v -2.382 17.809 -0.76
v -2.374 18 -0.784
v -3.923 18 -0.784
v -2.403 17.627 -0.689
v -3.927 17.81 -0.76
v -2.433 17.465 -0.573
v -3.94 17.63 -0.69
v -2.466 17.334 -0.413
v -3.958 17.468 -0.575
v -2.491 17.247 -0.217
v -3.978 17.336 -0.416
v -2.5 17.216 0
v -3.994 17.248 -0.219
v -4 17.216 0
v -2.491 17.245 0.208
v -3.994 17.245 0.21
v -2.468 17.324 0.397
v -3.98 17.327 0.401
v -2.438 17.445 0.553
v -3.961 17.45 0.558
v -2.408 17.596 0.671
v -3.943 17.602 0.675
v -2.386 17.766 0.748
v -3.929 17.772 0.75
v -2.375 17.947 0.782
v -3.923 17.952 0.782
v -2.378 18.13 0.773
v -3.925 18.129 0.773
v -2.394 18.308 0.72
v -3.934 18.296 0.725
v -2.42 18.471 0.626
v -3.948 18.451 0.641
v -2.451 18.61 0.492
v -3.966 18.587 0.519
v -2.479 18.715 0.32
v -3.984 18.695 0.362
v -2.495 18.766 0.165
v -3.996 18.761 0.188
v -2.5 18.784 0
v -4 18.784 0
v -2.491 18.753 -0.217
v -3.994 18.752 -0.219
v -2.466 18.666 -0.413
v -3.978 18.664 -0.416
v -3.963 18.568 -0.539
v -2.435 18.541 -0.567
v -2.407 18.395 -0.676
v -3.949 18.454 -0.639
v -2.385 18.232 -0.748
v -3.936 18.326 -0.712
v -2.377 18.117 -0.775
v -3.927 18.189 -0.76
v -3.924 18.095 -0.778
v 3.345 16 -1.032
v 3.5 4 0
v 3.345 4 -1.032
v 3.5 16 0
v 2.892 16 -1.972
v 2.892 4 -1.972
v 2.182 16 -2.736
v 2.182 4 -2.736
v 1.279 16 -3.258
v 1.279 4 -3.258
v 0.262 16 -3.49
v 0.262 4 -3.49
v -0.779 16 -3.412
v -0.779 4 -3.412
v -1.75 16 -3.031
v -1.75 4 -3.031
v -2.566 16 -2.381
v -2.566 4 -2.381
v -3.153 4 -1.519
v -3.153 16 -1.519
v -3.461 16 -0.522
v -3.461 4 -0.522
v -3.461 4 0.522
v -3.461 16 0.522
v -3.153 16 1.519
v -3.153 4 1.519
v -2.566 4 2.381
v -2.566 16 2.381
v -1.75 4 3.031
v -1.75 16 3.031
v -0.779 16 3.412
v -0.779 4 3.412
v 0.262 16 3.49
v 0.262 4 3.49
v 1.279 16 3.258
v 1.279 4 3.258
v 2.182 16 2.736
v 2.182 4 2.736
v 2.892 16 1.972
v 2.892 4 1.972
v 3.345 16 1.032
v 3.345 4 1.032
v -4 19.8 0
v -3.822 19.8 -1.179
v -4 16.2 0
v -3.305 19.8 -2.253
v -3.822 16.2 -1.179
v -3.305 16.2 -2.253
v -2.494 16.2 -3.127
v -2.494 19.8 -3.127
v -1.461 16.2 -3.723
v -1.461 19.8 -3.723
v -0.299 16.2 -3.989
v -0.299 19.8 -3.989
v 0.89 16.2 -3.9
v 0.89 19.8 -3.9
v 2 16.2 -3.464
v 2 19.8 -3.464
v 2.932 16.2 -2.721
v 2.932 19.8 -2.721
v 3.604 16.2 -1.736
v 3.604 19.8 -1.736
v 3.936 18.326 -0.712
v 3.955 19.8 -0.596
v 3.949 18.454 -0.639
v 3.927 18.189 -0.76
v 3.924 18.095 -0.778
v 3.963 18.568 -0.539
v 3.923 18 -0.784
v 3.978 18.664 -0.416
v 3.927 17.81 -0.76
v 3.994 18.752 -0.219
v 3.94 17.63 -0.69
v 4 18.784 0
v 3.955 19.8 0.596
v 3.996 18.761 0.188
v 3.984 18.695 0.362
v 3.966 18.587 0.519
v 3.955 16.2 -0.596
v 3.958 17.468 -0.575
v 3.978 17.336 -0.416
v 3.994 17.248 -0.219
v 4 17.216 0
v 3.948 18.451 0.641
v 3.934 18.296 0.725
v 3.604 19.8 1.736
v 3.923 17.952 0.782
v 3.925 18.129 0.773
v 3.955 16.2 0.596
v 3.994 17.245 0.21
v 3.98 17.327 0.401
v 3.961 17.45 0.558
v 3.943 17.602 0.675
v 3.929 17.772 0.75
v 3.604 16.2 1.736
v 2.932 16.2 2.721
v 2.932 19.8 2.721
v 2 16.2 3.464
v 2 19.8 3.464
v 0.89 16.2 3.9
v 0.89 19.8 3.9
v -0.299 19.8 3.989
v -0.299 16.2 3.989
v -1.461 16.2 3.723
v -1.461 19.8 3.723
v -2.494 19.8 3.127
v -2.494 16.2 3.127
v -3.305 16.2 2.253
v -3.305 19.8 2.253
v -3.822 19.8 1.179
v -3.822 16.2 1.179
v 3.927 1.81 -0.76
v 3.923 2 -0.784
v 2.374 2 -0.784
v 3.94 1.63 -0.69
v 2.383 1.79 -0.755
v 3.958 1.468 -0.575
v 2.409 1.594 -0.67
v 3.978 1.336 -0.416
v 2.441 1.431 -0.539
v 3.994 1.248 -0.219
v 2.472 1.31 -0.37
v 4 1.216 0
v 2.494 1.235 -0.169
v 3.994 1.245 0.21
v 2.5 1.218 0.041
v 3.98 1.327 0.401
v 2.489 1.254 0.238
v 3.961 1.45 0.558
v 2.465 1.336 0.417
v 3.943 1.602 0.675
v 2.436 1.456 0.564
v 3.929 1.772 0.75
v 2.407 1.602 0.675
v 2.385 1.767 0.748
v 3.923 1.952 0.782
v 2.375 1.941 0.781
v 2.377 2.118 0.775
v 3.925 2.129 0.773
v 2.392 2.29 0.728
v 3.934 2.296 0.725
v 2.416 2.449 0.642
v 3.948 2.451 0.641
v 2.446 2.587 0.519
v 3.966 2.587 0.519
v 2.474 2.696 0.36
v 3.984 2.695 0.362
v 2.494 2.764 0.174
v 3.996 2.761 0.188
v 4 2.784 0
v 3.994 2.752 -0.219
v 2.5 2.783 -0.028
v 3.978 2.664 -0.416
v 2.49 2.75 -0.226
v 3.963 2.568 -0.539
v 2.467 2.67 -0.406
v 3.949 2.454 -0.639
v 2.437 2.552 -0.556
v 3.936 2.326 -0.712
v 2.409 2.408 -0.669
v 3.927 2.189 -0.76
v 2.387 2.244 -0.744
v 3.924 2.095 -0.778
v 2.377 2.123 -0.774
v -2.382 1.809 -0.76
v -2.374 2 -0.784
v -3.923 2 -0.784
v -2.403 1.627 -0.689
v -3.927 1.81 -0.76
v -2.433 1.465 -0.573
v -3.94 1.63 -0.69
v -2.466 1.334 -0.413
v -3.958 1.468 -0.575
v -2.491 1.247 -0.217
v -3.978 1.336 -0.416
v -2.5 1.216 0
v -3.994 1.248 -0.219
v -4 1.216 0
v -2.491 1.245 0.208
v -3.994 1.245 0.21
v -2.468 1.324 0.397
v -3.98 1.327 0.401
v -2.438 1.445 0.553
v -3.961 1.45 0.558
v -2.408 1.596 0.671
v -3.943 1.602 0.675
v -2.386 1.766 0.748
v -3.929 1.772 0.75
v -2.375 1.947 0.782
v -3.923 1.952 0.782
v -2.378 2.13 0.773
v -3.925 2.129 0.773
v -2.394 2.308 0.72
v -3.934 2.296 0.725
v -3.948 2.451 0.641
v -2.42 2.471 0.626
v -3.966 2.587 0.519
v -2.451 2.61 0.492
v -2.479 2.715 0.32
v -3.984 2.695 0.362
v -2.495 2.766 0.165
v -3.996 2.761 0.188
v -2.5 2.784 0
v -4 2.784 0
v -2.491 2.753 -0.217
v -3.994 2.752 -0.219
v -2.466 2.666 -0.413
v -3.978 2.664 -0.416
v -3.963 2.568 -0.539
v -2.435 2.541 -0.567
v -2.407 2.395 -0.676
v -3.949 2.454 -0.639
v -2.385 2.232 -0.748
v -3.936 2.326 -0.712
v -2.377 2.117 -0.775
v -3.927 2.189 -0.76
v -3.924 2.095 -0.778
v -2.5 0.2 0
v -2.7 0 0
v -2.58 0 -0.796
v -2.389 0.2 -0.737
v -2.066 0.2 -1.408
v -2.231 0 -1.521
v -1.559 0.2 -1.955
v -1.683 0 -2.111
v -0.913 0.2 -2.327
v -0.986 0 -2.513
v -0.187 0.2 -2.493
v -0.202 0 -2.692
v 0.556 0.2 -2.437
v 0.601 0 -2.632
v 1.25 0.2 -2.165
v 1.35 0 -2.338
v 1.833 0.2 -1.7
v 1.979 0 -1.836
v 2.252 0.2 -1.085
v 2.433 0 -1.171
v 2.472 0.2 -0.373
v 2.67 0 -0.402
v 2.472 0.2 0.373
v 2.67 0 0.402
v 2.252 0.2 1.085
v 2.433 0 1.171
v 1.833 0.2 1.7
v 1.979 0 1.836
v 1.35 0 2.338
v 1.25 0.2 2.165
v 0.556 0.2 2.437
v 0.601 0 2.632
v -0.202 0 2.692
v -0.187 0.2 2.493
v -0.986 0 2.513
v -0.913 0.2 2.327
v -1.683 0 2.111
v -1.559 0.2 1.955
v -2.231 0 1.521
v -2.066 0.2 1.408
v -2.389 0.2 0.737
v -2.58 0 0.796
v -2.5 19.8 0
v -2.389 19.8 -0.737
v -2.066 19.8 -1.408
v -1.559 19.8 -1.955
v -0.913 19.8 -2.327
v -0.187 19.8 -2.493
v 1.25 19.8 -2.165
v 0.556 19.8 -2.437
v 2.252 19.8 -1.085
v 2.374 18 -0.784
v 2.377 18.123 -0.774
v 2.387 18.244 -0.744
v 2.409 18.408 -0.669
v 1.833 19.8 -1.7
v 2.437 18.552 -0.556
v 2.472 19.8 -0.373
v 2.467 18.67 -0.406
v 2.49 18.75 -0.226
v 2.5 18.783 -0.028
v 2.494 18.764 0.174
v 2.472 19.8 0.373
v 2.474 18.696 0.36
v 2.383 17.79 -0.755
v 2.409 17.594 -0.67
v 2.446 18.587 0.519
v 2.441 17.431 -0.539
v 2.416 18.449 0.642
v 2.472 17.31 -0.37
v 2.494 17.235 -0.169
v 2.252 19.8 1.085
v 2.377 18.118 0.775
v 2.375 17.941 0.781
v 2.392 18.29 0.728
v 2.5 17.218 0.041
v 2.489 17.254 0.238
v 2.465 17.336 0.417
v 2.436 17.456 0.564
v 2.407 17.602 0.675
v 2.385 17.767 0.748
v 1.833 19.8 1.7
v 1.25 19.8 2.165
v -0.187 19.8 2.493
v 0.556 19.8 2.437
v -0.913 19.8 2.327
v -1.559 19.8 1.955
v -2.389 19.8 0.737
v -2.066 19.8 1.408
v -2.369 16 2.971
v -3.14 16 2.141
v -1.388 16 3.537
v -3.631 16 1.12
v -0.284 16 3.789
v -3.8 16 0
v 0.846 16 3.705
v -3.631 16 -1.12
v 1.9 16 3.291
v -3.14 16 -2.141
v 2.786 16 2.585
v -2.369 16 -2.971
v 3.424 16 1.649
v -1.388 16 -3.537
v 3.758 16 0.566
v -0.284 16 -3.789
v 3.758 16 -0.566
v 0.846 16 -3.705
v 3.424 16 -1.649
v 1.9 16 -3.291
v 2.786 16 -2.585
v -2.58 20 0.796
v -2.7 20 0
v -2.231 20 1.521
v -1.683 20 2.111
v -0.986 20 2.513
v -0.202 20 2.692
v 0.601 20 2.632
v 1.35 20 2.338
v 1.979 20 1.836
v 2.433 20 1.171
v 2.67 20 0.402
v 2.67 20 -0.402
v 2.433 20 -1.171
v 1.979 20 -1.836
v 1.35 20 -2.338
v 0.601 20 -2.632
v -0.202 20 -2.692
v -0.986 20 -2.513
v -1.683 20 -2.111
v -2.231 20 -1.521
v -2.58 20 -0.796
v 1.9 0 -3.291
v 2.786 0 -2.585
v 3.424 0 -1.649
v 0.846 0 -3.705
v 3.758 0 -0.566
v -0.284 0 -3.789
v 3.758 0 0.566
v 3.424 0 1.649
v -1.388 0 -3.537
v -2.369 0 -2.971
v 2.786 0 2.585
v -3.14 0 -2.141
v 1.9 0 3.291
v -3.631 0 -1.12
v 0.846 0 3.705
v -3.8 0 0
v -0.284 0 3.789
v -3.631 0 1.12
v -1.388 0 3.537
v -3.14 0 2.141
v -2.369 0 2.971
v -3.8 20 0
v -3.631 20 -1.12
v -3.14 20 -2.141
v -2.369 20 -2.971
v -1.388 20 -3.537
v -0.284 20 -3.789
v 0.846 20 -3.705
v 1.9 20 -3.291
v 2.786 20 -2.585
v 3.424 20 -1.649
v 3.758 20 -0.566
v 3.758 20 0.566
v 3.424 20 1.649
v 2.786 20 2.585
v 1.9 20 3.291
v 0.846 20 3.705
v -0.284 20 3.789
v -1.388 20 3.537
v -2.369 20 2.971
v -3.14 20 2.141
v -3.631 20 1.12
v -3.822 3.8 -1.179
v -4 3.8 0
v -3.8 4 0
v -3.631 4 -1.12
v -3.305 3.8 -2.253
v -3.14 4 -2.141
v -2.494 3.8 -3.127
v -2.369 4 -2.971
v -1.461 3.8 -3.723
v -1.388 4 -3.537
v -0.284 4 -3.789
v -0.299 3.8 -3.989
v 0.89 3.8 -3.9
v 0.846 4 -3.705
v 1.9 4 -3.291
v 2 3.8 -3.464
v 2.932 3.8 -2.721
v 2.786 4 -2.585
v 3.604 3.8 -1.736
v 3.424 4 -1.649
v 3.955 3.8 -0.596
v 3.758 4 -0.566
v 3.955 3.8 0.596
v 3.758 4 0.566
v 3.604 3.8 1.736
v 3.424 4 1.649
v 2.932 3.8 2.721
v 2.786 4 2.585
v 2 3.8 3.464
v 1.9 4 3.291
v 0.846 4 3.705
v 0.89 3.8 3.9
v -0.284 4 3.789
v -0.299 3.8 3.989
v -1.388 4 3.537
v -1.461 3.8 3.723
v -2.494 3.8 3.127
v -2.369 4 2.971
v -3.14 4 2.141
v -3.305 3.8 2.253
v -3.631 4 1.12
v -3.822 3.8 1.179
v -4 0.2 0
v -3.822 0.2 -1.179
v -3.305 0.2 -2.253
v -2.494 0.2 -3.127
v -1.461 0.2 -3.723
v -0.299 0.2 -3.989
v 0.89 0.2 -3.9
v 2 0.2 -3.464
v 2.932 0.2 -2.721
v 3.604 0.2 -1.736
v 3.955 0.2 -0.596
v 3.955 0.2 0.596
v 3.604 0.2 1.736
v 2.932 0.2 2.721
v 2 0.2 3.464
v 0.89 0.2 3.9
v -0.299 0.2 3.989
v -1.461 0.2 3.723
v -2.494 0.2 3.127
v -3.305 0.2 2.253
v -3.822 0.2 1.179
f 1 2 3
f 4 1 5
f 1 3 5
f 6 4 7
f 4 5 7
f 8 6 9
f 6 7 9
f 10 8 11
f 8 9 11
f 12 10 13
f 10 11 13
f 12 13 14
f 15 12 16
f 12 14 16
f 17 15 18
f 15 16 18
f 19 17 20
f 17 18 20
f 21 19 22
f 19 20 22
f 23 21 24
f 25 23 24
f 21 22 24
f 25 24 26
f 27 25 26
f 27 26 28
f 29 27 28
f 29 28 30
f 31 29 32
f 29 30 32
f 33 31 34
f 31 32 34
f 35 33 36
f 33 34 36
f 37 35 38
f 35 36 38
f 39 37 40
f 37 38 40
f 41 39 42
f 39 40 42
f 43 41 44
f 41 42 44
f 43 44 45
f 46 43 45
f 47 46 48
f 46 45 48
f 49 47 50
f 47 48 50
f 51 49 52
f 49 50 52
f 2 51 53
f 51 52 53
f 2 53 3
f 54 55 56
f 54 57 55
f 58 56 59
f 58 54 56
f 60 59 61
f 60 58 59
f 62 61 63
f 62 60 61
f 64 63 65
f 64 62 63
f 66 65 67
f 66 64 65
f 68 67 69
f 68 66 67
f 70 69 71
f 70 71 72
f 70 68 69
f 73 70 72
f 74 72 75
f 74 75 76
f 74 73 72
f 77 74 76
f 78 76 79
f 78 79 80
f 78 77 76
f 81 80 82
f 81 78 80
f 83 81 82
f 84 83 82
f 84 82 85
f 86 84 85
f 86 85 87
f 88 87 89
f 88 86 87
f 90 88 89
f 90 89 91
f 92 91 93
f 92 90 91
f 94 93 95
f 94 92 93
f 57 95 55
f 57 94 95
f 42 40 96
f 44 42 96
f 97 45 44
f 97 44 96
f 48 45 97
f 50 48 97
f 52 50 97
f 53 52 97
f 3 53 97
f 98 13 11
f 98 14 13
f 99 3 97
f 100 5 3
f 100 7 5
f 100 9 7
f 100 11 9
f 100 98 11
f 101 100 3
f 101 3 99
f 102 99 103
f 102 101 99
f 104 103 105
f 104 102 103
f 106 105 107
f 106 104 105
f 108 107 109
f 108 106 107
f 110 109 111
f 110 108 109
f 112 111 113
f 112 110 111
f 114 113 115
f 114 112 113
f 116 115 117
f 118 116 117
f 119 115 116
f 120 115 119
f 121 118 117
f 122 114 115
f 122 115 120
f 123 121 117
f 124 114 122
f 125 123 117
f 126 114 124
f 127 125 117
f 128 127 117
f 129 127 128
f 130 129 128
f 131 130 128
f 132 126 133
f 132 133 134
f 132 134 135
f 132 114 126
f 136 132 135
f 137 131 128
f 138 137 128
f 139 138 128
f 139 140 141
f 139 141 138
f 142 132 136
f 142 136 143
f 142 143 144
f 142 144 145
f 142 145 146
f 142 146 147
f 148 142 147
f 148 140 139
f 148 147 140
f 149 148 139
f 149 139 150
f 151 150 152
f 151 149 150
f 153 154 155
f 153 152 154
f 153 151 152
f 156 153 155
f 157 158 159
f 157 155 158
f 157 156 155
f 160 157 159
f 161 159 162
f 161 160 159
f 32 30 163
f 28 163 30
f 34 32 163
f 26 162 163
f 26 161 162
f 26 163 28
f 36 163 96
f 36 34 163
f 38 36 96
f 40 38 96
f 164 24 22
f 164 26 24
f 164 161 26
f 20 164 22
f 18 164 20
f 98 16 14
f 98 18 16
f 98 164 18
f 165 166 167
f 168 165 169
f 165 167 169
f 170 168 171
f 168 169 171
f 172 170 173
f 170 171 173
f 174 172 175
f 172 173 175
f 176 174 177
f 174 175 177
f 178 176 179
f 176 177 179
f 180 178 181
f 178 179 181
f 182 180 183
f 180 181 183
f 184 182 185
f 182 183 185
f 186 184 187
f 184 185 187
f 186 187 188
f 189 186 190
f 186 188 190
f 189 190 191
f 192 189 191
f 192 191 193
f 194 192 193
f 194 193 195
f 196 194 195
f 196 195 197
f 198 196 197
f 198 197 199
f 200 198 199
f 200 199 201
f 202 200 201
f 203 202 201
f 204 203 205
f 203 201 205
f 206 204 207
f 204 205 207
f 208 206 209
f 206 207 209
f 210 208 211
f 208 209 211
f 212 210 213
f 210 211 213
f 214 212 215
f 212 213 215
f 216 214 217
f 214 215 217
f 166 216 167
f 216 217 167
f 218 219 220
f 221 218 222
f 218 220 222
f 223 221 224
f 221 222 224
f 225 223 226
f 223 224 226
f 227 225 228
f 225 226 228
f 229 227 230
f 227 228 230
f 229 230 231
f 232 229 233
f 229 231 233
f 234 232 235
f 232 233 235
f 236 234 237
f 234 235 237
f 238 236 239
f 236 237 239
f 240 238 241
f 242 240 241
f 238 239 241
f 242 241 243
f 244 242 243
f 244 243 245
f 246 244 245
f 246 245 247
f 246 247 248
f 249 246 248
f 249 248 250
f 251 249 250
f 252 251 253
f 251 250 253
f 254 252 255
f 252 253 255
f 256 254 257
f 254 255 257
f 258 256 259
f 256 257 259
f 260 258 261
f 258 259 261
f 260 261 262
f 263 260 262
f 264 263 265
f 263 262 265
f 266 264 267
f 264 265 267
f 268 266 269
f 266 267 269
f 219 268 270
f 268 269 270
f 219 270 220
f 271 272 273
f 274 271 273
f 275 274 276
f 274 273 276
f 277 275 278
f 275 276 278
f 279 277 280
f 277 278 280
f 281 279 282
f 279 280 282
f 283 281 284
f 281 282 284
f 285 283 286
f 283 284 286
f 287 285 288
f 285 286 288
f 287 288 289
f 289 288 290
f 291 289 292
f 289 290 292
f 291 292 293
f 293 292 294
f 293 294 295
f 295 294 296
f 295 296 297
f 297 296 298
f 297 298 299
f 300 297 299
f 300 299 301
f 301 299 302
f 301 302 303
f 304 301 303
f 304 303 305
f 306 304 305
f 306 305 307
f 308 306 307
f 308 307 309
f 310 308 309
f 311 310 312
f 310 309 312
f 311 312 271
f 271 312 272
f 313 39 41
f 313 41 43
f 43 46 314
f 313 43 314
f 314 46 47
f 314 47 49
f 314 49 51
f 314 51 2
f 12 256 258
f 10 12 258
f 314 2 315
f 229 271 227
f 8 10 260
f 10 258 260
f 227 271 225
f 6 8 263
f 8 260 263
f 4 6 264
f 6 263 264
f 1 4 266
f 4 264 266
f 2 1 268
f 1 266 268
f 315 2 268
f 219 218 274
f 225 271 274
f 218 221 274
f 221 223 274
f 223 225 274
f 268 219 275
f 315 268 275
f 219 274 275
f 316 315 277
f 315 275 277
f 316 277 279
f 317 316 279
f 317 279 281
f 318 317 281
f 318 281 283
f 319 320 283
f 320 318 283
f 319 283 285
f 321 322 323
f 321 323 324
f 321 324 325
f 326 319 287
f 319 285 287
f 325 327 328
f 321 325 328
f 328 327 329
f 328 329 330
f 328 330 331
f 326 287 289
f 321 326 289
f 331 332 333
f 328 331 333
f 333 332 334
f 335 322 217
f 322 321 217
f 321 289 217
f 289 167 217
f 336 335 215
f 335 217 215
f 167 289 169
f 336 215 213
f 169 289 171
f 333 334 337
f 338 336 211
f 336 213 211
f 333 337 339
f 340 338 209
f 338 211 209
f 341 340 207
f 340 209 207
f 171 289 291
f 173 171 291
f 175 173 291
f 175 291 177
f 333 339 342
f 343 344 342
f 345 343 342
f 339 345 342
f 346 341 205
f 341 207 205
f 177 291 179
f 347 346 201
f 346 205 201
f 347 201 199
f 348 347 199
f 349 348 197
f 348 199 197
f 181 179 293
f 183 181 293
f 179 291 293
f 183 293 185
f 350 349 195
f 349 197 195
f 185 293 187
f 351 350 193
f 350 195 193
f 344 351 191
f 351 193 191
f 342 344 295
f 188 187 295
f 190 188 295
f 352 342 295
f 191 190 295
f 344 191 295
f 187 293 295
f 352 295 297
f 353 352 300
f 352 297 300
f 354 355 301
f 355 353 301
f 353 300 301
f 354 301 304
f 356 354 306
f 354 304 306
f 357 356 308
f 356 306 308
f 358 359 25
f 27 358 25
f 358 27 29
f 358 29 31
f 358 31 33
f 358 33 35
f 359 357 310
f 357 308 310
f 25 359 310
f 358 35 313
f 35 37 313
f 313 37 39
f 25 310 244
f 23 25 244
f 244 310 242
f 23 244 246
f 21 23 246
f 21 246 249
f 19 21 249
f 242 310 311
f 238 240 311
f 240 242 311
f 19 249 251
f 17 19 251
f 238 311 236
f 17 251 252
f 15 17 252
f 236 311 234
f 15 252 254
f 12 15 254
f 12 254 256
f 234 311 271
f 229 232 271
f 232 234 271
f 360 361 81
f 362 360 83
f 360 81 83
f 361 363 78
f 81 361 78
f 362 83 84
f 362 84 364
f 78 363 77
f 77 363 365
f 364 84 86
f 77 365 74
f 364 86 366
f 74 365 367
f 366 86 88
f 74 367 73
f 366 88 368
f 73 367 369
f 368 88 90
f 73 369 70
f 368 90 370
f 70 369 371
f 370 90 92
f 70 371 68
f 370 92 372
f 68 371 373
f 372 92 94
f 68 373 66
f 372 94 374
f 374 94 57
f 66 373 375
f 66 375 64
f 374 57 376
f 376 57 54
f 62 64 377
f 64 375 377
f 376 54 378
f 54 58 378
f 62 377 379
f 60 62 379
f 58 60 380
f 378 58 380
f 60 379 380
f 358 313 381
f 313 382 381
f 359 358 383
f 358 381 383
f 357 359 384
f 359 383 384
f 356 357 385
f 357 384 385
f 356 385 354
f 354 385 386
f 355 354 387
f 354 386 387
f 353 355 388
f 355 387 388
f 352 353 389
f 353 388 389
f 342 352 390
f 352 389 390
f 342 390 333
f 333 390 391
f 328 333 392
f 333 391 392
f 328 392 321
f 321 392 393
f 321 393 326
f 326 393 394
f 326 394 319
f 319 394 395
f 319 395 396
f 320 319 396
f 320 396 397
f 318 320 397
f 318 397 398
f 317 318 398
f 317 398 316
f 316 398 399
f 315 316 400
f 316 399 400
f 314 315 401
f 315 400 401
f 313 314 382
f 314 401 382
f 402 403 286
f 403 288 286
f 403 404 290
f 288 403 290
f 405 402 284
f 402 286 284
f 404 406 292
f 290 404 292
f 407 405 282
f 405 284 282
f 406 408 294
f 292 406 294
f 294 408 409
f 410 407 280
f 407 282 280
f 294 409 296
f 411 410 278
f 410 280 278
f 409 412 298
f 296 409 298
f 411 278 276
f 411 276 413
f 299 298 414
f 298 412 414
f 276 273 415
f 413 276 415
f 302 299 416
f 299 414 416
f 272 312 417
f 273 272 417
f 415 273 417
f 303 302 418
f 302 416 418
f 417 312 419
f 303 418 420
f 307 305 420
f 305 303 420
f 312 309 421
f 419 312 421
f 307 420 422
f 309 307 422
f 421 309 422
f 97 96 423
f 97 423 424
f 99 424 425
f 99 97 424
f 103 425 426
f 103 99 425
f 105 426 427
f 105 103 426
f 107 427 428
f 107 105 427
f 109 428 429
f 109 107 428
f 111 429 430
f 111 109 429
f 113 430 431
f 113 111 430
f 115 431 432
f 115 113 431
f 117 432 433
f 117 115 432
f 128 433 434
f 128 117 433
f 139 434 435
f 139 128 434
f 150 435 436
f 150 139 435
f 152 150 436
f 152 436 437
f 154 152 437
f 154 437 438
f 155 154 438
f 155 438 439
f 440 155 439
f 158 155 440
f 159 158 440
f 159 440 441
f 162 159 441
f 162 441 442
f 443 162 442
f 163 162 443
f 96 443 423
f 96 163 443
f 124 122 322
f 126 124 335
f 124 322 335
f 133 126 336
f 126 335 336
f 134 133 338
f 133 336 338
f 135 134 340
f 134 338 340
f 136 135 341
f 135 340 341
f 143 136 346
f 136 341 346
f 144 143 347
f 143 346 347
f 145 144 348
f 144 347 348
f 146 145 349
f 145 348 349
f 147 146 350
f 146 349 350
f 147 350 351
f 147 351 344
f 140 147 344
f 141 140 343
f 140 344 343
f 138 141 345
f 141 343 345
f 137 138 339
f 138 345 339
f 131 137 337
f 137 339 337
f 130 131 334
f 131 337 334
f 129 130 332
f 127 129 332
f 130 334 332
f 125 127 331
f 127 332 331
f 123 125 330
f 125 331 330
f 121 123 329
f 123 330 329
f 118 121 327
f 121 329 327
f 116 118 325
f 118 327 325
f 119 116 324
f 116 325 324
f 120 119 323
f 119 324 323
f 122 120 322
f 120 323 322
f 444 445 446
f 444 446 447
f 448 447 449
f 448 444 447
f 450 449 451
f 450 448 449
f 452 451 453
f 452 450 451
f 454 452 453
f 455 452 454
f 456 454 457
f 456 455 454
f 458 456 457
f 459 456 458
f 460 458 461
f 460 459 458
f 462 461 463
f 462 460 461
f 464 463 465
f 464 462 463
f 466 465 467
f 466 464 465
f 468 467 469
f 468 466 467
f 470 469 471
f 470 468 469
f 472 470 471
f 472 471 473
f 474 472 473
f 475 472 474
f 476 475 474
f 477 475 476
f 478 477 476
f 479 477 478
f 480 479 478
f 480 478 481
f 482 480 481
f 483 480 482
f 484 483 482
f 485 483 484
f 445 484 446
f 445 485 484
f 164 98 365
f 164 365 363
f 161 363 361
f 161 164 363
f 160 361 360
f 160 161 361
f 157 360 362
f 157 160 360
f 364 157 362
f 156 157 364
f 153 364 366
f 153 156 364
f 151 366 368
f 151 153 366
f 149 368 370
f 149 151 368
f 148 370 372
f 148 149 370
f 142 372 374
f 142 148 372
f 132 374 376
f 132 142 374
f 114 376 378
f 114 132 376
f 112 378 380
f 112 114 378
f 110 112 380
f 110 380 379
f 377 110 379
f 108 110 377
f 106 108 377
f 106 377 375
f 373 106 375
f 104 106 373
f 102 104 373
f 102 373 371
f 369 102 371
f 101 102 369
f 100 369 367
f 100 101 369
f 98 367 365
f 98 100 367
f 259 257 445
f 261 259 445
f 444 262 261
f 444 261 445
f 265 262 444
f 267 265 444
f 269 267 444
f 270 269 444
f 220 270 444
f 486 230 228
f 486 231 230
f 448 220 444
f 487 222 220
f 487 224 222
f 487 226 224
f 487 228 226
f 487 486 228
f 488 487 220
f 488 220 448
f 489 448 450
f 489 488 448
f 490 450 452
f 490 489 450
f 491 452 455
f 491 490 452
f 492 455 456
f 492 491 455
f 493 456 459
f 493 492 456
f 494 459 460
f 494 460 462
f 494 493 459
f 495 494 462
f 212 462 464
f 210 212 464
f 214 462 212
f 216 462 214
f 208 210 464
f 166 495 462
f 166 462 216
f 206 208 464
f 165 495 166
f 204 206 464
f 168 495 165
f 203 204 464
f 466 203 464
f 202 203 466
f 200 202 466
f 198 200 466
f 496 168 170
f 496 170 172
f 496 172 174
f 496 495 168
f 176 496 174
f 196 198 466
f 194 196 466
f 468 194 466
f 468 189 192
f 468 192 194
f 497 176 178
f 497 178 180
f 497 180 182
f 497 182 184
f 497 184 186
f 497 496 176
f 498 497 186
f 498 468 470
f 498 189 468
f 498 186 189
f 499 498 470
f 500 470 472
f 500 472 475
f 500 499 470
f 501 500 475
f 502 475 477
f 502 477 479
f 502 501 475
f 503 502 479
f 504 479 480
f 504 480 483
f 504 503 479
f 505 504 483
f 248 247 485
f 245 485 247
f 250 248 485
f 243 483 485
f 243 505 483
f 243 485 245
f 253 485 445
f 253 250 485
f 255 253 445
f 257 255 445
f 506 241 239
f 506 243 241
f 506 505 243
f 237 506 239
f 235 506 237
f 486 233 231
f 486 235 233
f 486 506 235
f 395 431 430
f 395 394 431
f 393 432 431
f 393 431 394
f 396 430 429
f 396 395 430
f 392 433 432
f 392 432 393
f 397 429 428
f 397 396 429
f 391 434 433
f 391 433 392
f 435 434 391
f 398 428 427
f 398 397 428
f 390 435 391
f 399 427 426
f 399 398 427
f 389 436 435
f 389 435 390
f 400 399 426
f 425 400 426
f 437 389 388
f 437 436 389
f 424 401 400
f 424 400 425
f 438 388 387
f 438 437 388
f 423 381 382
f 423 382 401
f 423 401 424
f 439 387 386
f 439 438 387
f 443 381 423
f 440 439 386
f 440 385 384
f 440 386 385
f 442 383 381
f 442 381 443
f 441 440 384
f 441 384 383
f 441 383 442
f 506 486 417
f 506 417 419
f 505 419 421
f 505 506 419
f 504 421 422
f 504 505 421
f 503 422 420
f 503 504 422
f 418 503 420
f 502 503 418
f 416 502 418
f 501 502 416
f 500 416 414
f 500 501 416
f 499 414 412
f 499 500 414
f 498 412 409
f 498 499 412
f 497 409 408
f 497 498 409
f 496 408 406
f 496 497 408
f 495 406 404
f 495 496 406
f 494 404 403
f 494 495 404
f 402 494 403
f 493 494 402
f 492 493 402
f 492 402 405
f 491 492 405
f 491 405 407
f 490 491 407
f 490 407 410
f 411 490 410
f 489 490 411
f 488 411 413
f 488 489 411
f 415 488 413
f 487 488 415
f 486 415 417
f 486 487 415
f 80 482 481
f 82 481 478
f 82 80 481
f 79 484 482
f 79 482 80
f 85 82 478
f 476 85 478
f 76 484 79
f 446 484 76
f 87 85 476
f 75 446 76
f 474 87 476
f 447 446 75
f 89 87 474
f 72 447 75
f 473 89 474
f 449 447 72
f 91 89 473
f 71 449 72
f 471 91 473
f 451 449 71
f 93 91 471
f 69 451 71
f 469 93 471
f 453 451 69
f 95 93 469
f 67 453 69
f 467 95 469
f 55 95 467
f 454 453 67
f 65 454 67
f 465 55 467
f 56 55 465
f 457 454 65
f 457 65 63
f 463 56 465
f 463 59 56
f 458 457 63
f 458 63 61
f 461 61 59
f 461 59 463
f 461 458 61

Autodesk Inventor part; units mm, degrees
ref_plane "XZ Plane" through (0, 0, 0) normal (0, 1, 0) x (-1, 0, 0)
sketch "Sketch1" plane through (0, 0, 0) normal (0, 1, 0) x (-1, 0, 0)
  circle A0 centre (0, 0) radius 2.5
  circle A1 centre (0, 0) radius 4
  dimension "d0" = 5
  dimension "d1" = 8
extrude "Extrusion1" add sketch "Sketch1" along normal blind 20
ref_plane "Work Plane1" through (0, 10, 0) normal (0, 1, 0) x (1, 0, 0)
sketch "Sketch2" plane through (0, 10, 0) normal (0, 1, 0) x (1, 0, 0)
  circle A0 centre (0, 0) radius 2.5
  circle A1 centre (0, 0) radius 4 projected
  circle A2 centre (0, 0) radius 3.5
  dimension "d5" = 5
  dimension "d6" = 7
extrude "Extrusion2" cut sketch "Sketch2" along normal mid plane 12 contours A1
chamfer "Chamfer1" distance 0.2 angle 45 4 edges at (4, 0, 0) (4, 4, 0) (4, 16, 0) (4, 20, 0)
chamfer "Chamfer2" distance 0.2 angle 45 2 edges at (2.5, 20, 0) (2.5, 0, 0)
ref_plane "Work Plane2" through (4, 0, 0) normal (1, 0, 0) x (0, 1, 0)
sketch "Sketch3" plane through (4, 0, 0) normal (1, 0, 0) x (0, 1, 0)
  point P0 (0, 0)
  point P1 (2, 0)
  point P2 (18, 0)
  dimension "d15" = 16
  dimension "d16" = 2
hole "Hole1" at (4, 2, 0) at (4, 18, 0) direction (-1, 0, 0) diameter 1.567 end through all thread size "M2x0.4" class "6H" standard "ISO Metric profile"
properties part number "Khop_Noi_Truc_5_5"
